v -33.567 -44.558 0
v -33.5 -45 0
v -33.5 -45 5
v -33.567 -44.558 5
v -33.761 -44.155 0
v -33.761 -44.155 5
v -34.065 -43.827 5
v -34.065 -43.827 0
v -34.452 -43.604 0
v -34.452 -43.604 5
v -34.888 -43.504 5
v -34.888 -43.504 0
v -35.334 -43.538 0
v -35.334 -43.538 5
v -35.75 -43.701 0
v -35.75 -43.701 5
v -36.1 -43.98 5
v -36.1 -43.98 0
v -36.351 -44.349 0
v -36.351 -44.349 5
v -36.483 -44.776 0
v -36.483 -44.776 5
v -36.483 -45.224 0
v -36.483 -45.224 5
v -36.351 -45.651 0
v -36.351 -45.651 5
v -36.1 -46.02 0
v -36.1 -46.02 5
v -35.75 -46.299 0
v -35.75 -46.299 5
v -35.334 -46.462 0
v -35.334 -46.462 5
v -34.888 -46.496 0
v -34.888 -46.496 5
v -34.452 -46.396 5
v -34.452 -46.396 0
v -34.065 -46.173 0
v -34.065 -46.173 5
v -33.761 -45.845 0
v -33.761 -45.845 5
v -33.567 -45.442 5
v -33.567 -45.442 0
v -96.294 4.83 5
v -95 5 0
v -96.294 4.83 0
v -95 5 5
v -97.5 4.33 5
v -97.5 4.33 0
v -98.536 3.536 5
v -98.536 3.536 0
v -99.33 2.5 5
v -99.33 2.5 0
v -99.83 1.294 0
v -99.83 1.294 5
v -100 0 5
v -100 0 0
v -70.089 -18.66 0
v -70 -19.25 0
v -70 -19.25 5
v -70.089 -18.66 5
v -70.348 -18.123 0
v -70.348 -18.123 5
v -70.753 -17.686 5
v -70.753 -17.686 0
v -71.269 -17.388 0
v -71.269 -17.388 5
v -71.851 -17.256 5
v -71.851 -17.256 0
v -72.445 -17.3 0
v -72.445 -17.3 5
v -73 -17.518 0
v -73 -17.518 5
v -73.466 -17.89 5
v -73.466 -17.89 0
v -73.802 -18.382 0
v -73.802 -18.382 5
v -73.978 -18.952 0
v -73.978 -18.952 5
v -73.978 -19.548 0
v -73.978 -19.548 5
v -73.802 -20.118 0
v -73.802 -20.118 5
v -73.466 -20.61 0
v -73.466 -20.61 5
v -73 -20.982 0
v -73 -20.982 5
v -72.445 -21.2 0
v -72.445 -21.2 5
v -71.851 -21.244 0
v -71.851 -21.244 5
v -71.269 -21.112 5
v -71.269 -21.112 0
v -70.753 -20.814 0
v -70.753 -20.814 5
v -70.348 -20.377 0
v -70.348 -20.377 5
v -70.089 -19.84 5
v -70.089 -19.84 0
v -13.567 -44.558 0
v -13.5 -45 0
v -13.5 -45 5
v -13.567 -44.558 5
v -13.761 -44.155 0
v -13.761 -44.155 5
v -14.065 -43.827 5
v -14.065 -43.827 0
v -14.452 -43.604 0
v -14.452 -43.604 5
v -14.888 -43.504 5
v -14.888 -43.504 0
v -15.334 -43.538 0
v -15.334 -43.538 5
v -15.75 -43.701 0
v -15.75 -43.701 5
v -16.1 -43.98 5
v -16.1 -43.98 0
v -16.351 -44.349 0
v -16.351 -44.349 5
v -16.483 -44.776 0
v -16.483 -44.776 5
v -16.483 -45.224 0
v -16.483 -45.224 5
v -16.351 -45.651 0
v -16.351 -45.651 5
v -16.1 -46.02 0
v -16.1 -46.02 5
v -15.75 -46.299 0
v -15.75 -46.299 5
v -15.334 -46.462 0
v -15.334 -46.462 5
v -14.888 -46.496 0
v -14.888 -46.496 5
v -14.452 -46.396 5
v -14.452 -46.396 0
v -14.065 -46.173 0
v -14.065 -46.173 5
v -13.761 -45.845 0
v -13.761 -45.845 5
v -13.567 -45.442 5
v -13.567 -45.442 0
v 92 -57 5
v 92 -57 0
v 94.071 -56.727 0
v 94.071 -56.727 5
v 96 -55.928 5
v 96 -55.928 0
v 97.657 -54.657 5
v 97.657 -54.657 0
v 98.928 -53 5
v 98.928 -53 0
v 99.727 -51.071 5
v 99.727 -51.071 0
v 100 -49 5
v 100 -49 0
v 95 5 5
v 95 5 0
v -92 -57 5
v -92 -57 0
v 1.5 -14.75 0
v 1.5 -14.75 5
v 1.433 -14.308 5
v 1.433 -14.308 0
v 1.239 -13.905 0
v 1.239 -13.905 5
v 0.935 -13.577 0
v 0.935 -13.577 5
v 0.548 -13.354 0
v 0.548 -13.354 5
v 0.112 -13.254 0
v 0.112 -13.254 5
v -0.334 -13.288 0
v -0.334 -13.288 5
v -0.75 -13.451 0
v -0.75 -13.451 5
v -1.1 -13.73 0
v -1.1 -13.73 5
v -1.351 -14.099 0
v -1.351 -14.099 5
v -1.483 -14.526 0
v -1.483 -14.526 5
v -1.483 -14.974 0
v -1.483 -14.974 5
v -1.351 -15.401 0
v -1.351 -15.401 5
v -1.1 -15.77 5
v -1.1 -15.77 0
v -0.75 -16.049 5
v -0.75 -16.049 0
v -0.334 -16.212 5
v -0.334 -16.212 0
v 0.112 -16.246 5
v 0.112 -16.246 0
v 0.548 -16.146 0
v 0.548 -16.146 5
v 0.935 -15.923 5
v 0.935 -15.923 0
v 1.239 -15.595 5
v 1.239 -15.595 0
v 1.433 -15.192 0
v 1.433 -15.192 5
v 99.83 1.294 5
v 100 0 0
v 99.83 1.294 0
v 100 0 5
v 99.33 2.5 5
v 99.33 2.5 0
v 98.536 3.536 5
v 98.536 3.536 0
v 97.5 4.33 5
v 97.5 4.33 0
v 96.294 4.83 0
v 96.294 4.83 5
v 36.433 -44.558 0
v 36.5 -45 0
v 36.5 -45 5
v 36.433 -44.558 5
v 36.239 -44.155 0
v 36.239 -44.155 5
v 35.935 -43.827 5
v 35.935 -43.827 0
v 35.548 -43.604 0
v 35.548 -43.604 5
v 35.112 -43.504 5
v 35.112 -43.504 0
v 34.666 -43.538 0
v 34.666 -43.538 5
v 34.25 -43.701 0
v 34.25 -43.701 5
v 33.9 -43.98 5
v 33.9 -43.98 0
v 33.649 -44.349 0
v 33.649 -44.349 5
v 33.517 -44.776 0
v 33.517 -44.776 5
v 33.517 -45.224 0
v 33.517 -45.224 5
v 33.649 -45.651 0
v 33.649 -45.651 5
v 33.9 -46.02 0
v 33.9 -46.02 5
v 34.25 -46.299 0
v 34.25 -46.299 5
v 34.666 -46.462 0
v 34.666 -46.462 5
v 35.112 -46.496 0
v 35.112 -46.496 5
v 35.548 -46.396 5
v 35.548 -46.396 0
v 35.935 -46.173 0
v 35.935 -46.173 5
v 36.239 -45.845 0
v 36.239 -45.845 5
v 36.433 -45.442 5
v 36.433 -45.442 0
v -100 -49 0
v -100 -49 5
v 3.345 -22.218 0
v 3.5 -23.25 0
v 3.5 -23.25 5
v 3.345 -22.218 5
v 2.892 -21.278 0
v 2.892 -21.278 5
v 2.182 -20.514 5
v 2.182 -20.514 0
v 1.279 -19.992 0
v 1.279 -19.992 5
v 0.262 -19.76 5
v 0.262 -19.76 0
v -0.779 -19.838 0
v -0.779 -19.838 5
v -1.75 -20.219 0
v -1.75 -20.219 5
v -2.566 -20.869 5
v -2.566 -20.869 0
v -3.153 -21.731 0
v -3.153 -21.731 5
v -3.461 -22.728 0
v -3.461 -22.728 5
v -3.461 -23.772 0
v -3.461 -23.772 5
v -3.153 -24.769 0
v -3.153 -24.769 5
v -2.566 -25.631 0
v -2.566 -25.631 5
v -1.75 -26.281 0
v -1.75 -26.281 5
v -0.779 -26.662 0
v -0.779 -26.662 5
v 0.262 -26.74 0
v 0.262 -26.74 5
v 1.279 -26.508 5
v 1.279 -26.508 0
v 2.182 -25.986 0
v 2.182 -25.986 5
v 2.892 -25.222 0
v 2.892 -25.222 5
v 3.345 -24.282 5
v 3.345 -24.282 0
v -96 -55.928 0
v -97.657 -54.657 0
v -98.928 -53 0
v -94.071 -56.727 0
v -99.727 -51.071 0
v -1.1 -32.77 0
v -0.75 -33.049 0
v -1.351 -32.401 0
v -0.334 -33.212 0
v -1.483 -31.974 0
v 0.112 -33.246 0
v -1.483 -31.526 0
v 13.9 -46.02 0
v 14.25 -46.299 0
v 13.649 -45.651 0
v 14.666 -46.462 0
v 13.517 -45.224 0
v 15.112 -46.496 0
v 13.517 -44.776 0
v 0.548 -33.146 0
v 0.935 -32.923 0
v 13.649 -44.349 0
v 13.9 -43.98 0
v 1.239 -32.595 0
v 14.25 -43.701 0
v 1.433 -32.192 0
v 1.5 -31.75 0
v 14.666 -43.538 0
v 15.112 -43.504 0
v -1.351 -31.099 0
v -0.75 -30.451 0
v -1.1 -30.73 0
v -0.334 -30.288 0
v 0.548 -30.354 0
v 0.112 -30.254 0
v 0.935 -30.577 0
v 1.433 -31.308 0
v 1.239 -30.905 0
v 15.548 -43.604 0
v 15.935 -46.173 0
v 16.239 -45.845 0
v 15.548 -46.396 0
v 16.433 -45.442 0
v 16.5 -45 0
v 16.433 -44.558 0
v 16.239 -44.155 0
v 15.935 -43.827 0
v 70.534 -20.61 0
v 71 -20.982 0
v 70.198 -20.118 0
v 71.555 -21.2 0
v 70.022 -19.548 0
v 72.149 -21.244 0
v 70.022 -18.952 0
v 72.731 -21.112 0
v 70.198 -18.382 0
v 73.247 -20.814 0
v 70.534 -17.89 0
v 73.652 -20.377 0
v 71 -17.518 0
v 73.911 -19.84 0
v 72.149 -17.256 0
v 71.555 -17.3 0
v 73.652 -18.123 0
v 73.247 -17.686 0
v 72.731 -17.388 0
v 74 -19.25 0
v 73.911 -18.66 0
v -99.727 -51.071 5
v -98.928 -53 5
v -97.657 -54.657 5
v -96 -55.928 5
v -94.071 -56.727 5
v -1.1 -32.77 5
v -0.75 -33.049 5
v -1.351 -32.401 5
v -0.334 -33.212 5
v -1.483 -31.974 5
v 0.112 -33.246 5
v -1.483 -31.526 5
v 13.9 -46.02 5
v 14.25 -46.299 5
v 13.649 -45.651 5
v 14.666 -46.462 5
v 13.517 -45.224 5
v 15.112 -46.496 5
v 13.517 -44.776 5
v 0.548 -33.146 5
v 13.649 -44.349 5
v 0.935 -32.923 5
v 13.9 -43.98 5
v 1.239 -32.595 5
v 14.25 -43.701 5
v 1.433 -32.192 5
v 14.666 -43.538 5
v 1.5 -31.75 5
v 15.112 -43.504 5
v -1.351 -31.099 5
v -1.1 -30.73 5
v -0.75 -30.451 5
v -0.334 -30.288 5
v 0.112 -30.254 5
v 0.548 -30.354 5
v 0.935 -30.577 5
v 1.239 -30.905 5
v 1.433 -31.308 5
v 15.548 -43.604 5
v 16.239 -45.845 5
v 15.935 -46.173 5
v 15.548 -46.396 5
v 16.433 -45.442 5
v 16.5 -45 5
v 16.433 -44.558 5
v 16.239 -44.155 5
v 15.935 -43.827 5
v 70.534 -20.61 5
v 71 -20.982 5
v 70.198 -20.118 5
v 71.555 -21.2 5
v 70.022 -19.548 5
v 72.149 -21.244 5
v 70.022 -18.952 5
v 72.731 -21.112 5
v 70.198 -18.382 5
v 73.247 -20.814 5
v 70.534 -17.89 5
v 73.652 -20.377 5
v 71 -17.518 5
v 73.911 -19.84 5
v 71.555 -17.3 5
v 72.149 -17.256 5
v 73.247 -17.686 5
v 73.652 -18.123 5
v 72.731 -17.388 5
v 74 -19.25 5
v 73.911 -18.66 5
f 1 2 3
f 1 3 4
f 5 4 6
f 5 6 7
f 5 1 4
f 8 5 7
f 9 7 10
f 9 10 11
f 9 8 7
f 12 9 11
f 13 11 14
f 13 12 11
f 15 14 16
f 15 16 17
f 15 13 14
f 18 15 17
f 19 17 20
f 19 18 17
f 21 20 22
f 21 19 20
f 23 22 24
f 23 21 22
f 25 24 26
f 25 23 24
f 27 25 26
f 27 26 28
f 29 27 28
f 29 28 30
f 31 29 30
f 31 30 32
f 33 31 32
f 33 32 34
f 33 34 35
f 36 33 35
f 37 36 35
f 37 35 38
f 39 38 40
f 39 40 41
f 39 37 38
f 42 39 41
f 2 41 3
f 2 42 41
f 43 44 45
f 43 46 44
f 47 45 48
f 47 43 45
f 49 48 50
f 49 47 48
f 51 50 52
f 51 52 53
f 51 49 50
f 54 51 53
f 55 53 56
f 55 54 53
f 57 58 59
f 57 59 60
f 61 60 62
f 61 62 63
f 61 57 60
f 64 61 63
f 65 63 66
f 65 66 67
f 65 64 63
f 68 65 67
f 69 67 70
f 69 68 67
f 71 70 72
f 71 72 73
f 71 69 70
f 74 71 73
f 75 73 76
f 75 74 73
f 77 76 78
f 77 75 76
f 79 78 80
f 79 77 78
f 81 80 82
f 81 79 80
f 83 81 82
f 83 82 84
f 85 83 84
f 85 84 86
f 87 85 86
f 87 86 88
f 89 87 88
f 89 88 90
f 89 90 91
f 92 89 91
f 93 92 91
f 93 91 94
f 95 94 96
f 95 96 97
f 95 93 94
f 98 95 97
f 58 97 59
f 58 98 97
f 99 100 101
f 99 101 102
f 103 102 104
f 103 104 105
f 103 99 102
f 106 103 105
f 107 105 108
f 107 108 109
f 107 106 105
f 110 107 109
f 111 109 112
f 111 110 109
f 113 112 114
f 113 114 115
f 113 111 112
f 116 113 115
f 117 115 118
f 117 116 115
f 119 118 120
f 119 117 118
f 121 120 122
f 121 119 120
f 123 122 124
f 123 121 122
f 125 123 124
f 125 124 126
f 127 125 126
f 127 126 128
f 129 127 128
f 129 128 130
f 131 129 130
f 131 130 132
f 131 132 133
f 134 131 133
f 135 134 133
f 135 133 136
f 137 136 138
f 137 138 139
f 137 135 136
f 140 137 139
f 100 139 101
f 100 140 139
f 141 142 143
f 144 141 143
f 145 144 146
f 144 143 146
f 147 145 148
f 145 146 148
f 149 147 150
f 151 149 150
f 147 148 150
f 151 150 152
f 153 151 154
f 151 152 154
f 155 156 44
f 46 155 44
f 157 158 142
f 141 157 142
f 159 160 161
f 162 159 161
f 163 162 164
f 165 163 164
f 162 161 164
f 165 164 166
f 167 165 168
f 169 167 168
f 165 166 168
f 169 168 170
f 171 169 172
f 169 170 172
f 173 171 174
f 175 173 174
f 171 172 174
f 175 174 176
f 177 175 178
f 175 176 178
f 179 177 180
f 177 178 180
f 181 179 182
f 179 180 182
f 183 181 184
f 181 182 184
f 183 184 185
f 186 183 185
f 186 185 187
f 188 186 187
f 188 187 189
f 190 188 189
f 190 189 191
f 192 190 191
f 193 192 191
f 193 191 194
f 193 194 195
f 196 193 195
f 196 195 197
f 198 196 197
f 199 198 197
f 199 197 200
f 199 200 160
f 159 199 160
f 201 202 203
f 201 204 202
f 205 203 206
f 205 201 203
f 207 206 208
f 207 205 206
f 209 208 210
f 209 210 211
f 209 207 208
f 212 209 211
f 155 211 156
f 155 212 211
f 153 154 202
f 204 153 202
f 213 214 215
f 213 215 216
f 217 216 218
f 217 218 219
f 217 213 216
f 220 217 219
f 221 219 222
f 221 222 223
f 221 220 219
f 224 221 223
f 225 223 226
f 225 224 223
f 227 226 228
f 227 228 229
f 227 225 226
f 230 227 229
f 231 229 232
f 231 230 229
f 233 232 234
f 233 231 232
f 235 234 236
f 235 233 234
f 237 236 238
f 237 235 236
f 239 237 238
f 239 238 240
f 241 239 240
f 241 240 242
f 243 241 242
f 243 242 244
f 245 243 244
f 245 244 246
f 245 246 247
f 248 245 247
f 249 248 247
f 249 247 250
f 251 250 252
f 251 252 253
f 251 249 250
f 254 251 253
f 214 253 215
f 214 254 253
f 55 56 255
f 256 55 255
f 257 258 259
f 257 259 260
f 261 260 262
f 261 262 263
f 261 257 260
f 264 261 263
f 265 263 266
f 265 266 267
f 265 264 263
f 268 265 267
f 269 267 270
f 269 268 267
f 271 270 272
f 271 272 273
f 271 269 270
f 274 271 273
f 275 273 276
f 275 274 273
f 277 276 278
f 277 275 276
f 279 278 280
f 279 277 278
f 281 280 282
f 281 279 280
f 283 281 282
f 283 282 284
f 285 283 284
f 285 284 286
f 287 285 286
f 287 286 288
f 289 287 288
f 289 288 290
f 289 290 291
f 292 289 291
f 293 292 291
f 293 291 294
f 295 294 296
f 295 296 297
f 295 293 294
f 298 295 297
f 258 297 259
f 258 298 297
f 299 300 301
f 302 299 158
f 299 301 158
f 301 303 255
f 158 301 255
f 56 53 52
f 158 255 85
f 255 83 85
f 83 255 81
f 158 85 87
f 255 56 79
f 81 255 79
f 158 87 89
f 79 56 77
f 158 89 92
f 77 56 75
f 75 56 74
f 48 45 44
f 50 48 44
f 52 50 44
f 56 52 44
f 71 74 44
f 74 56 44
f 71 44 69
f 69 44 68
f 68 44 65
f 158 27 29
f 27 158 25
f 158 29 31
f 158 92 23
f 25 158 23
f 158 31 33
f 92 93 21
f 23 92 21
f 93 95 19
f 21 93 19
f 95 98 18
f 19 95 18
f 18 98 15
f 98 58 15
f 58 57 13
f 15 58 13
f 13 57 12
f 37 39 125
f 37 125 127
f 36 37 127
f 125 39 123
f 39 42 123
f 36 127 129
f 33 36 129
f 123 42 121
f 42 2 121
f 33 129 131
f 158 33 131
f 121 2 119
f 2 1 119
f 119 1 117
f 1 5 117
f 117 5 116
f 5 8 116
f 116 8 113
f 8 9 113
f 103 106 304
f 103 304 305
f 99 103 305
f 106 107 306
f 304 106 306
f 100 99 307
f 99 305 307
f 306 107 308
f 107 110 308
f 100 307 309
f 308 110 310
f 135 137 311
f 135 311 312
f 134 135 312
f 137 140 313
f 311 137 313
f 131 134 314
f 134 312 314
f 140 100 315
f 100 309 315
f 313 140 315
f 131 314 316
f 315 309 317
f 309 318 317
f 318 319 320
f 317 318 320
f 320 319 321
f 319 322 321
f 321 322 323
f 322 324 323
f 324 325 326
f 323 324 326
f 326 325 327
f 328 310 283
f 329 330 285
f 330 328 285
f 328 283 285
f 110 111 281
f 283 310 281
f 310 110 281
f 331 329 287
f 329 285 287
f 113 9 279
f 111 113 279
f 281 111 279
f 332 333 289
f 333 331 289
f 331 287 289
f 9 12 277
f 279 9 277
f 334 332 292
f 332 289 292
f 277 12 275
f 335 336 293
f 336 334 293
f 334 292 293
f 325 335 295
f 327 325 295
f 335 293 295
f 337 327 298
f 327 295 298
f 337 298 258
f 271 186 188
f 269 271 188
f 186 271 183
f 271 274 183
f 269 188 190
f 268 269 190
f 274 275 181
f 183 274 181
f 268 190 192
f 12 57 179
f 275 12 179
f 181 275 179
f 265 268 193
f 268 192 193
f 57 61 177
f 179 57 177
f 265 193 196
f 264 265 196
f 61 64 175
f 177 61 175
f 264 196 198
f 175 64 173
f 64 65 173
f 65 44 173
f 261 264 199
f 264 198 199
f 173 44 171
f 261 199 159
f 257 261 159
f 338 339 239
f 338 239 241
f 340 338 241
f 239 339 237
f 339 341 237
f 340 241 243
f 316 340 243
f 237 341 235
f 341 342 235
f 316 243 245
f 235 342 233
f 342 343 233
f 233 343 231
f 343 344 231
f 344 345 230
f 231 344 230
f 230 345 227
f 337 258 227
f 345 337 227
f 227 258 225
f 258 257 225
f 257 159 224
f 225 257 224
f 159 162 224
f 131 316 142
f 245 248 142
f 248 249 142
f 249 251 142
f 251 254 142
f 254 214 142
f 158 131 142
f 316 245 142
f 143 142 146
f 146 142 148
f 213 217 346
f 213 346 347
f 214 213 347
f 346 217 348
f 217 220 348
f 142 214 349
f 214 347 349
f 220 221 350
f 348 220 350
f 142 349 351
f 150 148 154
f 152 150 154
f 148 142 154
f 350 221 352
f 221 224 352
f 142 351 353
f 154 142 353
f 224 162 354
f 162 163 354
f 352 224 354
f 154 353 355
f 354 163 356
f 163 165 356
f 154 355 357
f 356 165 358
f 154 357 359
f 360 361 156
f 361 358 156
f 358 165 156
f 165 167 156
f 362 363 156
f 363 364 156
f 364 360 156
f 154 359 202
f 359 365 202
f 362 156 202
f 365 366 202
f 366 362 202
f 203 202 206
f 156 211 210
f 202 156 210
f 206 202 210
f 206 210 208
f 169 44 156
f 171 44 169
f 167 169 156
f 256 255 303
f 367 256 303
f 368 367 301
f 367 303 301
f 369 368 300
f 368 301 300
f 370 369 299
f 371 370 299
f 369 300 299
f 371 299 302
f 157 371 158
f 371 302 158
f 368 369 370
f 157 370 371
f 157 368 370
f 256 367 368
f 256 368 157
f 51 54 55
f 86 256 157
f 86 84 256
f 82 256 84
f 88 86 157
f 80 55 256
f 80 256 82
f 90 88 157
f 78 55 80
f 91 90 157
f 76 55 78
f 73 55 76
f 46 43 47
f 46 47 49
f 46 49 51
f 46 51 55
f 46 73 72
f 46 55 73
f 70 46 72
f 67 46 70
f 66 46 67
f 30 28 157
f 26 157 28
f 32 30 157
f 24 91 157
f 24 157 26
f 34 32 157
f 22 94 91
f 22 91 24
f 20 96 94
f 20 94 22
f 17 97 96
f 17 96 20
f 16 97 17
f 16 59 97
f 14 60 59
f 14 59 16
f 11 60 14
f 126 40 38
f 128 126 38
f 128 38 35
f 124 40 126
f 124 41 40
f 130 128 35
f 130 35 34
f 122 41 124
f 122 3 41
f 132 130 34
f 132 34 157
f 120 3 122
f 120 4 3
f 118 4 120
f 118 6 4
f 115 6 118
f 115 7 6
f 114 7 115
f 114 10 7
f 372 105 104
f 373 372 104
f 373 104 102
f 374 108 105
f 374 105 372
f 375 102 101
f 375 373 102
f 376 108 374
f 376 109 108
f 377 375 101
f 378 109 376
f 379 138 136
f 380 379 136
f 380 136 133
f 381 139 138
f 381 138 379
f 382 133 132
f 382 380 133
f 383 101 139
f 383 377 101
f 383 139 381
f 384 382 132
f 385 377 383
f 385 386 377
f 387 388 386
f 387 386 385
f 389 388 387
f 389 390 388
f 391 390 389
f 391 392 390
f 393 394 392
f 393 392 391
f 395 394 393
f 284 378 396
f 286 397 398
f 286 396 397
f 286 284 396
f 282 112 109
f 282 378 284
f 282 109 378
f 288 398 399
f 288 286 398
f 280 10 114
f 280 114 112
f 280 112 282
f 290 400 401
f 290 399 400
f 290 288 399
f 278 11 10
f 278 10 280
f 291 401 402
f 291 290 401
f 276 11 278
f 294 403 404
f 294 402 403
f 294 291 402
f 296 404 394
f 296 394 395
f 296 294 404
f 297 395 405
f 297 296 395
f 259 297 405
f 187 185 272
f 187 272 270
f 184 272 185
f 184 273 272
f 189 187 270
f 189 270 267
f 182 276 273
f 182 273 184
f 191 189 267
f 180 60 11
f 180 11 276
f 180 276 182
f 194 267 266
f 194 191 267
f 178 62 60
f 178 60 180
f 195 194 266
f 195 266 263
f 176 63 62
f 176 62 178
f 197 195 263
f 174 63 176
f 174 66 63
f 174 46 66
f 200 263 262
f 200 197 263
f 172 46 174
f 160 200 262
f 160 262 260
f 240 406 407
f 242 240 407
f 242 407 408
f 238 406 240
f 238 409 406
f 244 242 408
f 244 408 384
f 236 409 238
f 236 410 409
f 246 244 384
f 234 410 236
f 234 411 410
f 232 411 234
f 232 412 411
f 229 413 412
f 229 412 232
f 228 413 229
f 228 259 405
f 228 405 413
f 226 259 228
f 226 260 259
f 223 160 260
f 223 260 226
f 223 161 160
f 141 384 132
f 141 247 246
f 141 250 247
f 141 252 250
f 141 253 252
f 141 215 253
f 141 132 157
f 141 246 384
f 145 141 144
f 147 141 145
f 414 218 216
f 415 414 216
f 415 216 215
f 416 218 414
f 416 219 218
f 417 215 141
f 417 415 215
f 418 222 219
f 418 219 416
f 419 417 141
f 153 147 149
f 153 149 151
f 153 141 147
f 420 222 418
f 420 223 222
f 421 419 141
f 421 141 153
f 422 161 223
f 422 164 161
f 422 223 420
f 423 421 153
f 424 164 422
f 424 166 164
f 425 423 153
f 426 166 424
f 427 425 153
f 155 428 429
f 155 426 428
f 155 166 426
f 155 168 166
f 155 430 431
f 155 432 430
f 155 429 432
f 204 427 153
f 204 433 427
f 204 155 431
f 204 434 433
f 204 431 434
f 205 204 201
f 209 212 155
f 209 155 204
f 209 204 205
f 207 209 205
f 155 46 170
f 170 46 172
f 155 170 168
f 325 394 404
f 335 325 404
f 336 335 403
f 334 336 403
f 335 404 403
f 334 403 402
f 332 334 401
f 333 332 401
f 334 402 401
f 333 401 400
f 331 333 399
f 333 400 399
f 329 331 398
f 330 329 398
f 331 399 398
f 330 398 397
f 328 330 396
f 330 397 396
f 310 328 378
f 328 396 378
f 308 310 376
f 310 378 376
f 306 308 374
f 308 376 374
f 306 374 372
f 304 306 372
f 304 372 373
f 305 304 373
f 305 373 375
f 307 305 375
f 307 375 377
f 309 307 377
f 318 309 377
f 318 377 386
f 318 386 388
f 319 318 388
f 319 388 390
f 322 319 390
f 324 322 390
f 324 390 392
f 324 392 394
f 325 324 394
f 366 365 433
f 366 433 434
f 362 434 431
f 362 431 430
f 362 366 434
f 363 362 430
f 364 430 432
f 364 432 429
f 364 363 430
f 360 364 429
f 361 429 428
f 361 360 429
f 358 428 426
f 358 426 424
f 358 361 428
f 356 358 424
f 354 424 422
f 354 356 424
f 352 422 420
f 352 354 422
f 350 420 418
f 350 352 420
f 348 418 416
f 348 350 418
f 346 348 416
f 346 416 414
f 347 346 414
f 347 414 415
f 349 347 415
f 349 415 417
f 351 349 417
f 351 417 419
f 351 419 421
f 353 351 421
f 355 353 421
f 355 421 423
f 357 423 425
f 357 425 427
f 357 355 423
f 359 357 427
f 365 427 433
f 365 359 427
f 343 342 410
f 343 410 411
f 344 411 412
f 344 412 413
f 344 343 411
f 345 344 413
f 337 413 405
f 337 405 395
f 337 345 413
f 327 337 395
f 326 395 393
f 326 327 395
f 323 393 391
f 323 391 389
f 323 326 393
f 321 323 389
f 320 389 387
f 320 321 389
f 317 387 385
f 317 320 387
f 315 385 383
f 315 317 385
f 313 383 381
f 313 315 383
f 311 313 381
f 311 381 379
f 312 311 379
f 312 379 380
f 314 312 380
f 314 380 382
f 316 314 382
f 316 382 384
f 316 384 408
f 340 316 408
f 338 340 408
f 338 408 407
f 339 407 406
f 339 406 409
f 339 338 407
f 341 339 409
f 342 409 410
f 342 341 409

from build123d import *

# Parameters (mm, degrees)
CROQUIS1_R              = 1.5
CROQUIS1_R_2            = 2
CROQUIS1_R_3            = 3.5
SALIENTE_EXTRUIR1_DEPTH = 5
REDONDEO1_R             = 5
CROQUIS2_R              = 1.5
CORTAR_EXTRUIR1_DEPTH   = 116.212846506


with BuildPart() as part:
    # Croquis1 → Saliente-Extruir1 (new body)
    with BuildSketch(Plane.XY):
        with BuildLine():
            Line((100, -49), (100, 0))
            Line((100, 0), (100, 5))
            Line((100, 5), (-100, 5))
            Line((-100, 5), (-100, 0))
            Line((-100, 0), (-100, -49))
            ThreePointArc((-100, -49), (-97.656854249, -54.656854249), (-92, -57))
            Line((-92, -57), (92, -57))
            ThreePointArc((92, -57), (97.656854249, -54.656854249), (100, -49))
        make_face()
        with Locations((-35, -45)):
            Circle(CROQUIS1_R, mode=Mode.SUBTRACT)
        with Locations((-15, -45)):
            Circle(CROQUIS1_R, mode=Mode.SUBTRACT)
        with Locations((15, -45)):
            Circle(CROQUIS1_R, mode=Mode.SUBTRACT)
        with Locations((35, -45)):
            Circle(CROQUIS1_R, mode=Mode.SUBTRACT)
        with Locations((-72, -19.25)):
            Circle(CROQUIS1_R_2, mode=Mode.SUBTRACT)
        with Locations((0, -23.25)):
            Circle(CROQUIS1_R_3, mode=Mode.SUBTRACT)
        with Locations((72, -19.25)):
            Circle(CROQUIS1_R_2, mode=Mode.SUBTRACT)
    extrude(amount=SALIENTE_EXTRUIR1_DEPTH)

    # Redondeo1
    redondeo1_edges = [part.edges().sort_by_distance(p)[0] for p in [
        (-100, 5, 2.5),
        (100, 5, 2.5),
    ]]
    fillet(redondeo1_edges, radius=REDONDEO1_R)

    # Croquis2 → Cortar-Extruir1 (cut, through all)
    with BuildSketch(Plane.XY.offset(5)):
        with Locations((0, -14.75)):
            Circle(CROQUIS2_R)
        with Locations((0, -31.75)):
            Circle(CROQUIS2_R)
    extrude(amount=-CORTAR_EXTRUIR1_DEPTH, mode=Mode.SUBTRACT)


solid = part.part
